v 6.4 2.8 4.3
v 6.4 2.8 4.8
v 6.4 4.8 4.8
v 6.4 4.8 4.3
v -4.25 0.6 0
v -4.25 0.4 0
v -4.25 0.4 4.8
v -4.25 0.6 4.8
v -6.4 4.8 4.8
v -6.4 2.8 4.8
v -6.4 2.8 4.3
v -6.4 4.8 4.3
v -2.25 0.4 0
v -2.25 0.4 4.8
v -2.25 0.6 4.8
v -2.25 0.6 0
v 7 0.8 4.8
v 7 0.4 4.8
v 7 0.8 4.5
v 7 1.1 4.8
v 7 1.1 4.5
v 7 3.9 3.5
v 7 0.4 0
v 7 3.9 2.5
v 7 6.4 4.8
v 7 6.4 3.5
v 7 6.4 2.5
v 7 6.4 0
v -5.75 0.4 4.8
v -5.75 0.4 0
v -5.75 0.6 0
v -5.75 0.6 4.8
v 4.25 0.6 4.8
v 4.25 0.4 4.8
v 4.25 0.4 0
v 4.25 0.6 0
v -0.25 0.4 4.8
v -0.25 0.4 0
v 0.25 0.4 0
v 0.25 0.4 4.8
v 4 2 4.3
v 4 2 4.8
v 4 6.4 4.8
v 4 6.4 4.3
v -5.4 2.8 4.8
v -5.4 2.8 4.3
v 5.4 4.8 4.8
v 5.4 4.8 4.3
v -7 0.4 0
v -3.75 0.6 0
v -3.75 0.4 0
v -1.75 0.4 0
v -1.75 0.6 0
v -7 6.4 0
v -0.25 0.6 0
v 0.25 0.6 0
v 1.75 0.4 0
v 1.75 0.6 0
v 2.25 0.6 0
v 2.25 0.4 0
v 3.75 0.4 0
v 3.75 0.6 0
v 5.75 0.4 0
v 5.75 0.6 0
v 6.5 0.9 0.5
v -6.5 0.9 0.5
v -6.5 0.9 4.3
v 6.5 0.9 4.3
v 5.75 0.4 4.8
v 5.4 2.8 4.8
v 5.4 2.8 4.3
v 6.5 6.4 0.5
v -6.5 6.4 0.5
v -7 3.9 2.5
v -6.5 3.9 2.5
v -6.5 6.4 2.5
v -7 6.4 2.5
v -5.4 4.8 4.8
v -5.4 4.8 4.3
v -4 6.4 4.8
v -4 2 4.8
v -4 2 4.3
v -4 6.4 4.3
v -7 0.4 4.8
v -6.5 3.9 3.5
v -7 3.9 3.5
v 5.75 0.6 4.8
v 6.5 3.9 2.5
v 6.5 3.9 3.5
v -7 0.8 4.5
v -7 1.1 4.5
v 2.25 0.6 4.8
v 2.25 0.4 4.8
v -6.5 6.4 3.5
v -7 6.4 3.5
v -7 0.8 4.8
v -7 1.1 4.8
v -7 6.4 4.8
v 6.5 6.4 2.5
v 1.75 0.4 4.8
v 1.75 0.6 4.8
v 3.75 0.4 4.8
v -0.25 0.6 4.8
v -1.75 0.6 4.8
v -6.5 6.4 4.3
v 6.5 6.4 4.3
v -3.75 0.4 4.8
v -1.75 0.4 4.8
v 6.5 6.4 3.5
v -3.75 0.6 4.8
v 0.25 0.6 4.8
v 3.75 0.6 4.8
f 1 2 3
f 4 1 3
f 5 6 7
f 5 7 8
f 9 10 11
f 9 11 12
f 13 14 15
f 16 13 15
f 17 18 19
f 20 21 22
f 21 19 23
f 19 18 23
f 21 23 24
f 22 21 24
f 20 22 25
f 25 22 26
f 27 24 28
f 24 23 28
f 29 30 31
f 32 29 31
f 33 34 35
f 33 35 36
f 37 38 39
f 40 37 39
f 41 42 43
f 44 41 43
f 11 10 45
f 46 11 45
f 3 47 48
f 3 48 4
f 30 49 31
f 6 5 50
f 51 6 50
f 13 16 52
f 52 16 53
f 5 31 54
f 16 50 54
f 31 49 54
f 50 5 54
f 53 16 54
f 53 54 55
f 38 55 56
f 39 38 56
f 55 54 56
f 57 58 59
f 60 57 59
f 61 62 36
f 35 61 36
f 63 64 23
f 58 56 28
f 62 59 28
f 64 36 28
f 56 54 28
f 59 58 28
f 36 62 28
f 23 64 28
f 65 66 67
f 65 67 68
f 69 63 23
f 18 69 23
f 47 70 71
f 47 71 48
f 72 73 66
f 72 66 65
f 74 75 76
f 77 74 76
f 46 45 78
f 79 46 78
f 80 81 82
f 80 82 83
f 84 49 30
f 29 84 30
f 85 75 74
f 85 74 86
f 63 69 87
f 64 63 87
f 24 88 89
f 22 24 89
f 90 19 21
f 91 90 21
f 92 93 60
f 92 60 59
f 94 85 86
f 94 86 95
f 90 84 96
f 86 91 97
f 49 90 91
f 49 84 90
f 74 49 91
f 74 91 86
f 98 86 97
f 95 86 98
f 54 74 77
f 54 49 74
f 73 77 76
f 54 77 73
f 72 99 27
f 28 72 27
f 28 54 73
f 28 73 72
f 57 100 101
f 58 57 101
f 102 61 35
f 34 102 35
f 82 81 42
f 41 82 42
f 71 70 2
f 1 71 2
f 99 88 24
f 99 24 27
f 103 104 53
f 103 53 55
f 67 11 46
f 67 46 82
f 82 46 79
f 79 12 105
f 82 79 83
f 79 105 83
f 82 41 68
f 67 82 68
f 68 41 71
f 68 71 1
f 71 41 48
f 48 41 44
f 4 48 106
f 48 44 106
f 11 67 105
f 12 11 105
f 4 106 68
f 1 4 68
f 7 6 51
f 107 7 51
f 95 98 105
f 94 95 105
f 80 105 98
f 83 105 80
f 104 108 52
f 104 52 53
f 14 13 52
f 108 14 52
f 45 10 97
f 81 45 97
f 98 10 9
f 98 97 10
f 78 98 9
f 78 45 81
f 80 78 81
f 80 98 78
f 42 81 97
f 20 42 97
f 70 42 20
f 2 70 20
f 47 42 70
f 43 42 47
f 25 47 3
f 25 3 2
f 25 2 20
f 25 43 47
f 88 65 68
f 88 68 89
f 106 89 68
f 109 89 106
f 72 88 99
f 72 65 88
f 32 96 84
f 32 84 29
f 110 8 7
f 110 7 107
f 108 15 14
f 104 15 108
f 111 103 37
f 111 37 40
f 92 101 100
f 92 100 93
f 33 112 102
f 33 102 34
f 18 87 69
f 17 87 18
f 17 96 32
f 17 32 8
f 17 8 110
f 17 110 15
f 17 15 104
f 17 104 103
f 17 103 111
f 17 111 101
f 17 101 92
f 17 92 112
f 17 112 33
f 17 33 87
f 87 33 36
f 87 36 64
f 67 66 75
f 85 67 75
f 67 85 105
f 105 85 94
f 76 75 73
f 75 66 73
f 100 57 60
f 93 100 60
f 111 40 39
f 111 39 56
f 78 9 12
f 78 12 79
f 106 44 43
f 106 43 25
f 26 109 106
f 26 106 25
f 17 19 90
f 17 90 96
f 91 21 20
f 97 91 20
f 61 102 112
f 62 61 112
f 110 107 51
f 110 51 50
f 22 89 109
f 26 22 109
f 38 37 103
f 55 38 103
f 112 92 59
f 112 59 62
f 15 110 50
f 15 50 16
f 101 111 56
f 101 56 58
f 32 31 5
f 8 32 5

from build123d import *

# Parameters (mm, degrees)
SKETCH_W             = 14
SKETCH_H             = 6
PAD_DEPTH            = 4.8
THICKNESS_T          = -0.5
SKETCH001_W          = 8
SKETCH001_H          = 4.4
SKETCH001_W_2        = 1
SKETCH001_H_2        = 2
POCKET_DEPTH         = 0.5
SKETCH002_W          = 2.5
SKETCH002_H          = 1
SKETCH002_W_2        = 0.3
SKETCH002_H_2        = 0.3
POCKET001_DEPTH      = 7.001
POCKET001_DEPTH_BACK = 7.001
SKETCH004_W          = 1.5
SKETCH004_H          = 0.2
POCKET002_DEPTH      = 0.001
POCKET002_DEPTH_BACK = 4.801
LINEARPATTERN_COUNT  = 6
LINEARPATTERN_PITCH  = 2


with BuildPart() as part:
    # Sketch → Pad (new body)
    with BuildSketch(Plane.XY):
        with Locations((0, 3.4)):
            Rectangle(SKETCH_W, SKETCH_H)
    extrude(amount=PAD_DEPTH)

    # Thickness
    thickness_openings = [part.faces().sort_by_distance(p)[0] for p in [
        (0, 6.4, 2.4),
    ]]
    offset(amount=THICKNESS_T, openings=thickness_openings)

    # Sketch001 → Pocket (cut)
    with BuildSketch(Plane.XY.offset(4.8)):
        with Locations((0, 4.2)):
            Rectangle(SKETCH001_W, SKETCH001_H)
        with Locations((5.9, 3.8)):
            Rectangle(SKETCH001_W_2, SKETCH001_H_2)
        with Locations((-5.9, 3.8)):
            Rectangle(SKETCH001_W_2, SKETCH001_H_2)
    extrude(amount=-POCKET_DEPTH, mode=Mode.SUBTRACT)

    # Sketch002 → Pocket001 (cut, two sides)
    with BuildSketch(Plane.YZ) as pocket001_sk:
        with Locations((5.15, 3)):
            Rectangle(SKETCH002_W, SKETCH002_H)
        with Locations((0.95, 4.65)):
            Rectangle(SKETCH002_W_2, SKETCH002_H_2)
    extrude(amount=-POCKET001_DEPTH, mode=Mode.SUBTRACT)
    extrude(pocket001_sk.sketch, amount=POCKET001_DEPTH_BACK, mode=Mode.SUBTRACT)

    # Sketch004 → Pocket002 (cut, two sides)
    with BuildSketch(Plane.XY) as pocket002_sk:
        with Locations((-5, 0.5)):
            Rectangle(SKETCH004_W, SKETCH004_H)
    pocket002 = extrude(amount=-POCKET002_DEPTH, mode=Mode.SUBTRACT) + extrude(pocket002_sk.sketch, amount=POCKET002_DEPTH_BACK, mode=Mode.SUBTRACT)

    # LinearPattern: Pocket002 ×6
    with Locations(*[(i * LINEARPATTERN_PITCH, 0, 0) for i in range(1, LINEARPATTERN_COUNT)]):
        add(pocket002, mode=Mode.SUBTRACT)


solid = part.part
